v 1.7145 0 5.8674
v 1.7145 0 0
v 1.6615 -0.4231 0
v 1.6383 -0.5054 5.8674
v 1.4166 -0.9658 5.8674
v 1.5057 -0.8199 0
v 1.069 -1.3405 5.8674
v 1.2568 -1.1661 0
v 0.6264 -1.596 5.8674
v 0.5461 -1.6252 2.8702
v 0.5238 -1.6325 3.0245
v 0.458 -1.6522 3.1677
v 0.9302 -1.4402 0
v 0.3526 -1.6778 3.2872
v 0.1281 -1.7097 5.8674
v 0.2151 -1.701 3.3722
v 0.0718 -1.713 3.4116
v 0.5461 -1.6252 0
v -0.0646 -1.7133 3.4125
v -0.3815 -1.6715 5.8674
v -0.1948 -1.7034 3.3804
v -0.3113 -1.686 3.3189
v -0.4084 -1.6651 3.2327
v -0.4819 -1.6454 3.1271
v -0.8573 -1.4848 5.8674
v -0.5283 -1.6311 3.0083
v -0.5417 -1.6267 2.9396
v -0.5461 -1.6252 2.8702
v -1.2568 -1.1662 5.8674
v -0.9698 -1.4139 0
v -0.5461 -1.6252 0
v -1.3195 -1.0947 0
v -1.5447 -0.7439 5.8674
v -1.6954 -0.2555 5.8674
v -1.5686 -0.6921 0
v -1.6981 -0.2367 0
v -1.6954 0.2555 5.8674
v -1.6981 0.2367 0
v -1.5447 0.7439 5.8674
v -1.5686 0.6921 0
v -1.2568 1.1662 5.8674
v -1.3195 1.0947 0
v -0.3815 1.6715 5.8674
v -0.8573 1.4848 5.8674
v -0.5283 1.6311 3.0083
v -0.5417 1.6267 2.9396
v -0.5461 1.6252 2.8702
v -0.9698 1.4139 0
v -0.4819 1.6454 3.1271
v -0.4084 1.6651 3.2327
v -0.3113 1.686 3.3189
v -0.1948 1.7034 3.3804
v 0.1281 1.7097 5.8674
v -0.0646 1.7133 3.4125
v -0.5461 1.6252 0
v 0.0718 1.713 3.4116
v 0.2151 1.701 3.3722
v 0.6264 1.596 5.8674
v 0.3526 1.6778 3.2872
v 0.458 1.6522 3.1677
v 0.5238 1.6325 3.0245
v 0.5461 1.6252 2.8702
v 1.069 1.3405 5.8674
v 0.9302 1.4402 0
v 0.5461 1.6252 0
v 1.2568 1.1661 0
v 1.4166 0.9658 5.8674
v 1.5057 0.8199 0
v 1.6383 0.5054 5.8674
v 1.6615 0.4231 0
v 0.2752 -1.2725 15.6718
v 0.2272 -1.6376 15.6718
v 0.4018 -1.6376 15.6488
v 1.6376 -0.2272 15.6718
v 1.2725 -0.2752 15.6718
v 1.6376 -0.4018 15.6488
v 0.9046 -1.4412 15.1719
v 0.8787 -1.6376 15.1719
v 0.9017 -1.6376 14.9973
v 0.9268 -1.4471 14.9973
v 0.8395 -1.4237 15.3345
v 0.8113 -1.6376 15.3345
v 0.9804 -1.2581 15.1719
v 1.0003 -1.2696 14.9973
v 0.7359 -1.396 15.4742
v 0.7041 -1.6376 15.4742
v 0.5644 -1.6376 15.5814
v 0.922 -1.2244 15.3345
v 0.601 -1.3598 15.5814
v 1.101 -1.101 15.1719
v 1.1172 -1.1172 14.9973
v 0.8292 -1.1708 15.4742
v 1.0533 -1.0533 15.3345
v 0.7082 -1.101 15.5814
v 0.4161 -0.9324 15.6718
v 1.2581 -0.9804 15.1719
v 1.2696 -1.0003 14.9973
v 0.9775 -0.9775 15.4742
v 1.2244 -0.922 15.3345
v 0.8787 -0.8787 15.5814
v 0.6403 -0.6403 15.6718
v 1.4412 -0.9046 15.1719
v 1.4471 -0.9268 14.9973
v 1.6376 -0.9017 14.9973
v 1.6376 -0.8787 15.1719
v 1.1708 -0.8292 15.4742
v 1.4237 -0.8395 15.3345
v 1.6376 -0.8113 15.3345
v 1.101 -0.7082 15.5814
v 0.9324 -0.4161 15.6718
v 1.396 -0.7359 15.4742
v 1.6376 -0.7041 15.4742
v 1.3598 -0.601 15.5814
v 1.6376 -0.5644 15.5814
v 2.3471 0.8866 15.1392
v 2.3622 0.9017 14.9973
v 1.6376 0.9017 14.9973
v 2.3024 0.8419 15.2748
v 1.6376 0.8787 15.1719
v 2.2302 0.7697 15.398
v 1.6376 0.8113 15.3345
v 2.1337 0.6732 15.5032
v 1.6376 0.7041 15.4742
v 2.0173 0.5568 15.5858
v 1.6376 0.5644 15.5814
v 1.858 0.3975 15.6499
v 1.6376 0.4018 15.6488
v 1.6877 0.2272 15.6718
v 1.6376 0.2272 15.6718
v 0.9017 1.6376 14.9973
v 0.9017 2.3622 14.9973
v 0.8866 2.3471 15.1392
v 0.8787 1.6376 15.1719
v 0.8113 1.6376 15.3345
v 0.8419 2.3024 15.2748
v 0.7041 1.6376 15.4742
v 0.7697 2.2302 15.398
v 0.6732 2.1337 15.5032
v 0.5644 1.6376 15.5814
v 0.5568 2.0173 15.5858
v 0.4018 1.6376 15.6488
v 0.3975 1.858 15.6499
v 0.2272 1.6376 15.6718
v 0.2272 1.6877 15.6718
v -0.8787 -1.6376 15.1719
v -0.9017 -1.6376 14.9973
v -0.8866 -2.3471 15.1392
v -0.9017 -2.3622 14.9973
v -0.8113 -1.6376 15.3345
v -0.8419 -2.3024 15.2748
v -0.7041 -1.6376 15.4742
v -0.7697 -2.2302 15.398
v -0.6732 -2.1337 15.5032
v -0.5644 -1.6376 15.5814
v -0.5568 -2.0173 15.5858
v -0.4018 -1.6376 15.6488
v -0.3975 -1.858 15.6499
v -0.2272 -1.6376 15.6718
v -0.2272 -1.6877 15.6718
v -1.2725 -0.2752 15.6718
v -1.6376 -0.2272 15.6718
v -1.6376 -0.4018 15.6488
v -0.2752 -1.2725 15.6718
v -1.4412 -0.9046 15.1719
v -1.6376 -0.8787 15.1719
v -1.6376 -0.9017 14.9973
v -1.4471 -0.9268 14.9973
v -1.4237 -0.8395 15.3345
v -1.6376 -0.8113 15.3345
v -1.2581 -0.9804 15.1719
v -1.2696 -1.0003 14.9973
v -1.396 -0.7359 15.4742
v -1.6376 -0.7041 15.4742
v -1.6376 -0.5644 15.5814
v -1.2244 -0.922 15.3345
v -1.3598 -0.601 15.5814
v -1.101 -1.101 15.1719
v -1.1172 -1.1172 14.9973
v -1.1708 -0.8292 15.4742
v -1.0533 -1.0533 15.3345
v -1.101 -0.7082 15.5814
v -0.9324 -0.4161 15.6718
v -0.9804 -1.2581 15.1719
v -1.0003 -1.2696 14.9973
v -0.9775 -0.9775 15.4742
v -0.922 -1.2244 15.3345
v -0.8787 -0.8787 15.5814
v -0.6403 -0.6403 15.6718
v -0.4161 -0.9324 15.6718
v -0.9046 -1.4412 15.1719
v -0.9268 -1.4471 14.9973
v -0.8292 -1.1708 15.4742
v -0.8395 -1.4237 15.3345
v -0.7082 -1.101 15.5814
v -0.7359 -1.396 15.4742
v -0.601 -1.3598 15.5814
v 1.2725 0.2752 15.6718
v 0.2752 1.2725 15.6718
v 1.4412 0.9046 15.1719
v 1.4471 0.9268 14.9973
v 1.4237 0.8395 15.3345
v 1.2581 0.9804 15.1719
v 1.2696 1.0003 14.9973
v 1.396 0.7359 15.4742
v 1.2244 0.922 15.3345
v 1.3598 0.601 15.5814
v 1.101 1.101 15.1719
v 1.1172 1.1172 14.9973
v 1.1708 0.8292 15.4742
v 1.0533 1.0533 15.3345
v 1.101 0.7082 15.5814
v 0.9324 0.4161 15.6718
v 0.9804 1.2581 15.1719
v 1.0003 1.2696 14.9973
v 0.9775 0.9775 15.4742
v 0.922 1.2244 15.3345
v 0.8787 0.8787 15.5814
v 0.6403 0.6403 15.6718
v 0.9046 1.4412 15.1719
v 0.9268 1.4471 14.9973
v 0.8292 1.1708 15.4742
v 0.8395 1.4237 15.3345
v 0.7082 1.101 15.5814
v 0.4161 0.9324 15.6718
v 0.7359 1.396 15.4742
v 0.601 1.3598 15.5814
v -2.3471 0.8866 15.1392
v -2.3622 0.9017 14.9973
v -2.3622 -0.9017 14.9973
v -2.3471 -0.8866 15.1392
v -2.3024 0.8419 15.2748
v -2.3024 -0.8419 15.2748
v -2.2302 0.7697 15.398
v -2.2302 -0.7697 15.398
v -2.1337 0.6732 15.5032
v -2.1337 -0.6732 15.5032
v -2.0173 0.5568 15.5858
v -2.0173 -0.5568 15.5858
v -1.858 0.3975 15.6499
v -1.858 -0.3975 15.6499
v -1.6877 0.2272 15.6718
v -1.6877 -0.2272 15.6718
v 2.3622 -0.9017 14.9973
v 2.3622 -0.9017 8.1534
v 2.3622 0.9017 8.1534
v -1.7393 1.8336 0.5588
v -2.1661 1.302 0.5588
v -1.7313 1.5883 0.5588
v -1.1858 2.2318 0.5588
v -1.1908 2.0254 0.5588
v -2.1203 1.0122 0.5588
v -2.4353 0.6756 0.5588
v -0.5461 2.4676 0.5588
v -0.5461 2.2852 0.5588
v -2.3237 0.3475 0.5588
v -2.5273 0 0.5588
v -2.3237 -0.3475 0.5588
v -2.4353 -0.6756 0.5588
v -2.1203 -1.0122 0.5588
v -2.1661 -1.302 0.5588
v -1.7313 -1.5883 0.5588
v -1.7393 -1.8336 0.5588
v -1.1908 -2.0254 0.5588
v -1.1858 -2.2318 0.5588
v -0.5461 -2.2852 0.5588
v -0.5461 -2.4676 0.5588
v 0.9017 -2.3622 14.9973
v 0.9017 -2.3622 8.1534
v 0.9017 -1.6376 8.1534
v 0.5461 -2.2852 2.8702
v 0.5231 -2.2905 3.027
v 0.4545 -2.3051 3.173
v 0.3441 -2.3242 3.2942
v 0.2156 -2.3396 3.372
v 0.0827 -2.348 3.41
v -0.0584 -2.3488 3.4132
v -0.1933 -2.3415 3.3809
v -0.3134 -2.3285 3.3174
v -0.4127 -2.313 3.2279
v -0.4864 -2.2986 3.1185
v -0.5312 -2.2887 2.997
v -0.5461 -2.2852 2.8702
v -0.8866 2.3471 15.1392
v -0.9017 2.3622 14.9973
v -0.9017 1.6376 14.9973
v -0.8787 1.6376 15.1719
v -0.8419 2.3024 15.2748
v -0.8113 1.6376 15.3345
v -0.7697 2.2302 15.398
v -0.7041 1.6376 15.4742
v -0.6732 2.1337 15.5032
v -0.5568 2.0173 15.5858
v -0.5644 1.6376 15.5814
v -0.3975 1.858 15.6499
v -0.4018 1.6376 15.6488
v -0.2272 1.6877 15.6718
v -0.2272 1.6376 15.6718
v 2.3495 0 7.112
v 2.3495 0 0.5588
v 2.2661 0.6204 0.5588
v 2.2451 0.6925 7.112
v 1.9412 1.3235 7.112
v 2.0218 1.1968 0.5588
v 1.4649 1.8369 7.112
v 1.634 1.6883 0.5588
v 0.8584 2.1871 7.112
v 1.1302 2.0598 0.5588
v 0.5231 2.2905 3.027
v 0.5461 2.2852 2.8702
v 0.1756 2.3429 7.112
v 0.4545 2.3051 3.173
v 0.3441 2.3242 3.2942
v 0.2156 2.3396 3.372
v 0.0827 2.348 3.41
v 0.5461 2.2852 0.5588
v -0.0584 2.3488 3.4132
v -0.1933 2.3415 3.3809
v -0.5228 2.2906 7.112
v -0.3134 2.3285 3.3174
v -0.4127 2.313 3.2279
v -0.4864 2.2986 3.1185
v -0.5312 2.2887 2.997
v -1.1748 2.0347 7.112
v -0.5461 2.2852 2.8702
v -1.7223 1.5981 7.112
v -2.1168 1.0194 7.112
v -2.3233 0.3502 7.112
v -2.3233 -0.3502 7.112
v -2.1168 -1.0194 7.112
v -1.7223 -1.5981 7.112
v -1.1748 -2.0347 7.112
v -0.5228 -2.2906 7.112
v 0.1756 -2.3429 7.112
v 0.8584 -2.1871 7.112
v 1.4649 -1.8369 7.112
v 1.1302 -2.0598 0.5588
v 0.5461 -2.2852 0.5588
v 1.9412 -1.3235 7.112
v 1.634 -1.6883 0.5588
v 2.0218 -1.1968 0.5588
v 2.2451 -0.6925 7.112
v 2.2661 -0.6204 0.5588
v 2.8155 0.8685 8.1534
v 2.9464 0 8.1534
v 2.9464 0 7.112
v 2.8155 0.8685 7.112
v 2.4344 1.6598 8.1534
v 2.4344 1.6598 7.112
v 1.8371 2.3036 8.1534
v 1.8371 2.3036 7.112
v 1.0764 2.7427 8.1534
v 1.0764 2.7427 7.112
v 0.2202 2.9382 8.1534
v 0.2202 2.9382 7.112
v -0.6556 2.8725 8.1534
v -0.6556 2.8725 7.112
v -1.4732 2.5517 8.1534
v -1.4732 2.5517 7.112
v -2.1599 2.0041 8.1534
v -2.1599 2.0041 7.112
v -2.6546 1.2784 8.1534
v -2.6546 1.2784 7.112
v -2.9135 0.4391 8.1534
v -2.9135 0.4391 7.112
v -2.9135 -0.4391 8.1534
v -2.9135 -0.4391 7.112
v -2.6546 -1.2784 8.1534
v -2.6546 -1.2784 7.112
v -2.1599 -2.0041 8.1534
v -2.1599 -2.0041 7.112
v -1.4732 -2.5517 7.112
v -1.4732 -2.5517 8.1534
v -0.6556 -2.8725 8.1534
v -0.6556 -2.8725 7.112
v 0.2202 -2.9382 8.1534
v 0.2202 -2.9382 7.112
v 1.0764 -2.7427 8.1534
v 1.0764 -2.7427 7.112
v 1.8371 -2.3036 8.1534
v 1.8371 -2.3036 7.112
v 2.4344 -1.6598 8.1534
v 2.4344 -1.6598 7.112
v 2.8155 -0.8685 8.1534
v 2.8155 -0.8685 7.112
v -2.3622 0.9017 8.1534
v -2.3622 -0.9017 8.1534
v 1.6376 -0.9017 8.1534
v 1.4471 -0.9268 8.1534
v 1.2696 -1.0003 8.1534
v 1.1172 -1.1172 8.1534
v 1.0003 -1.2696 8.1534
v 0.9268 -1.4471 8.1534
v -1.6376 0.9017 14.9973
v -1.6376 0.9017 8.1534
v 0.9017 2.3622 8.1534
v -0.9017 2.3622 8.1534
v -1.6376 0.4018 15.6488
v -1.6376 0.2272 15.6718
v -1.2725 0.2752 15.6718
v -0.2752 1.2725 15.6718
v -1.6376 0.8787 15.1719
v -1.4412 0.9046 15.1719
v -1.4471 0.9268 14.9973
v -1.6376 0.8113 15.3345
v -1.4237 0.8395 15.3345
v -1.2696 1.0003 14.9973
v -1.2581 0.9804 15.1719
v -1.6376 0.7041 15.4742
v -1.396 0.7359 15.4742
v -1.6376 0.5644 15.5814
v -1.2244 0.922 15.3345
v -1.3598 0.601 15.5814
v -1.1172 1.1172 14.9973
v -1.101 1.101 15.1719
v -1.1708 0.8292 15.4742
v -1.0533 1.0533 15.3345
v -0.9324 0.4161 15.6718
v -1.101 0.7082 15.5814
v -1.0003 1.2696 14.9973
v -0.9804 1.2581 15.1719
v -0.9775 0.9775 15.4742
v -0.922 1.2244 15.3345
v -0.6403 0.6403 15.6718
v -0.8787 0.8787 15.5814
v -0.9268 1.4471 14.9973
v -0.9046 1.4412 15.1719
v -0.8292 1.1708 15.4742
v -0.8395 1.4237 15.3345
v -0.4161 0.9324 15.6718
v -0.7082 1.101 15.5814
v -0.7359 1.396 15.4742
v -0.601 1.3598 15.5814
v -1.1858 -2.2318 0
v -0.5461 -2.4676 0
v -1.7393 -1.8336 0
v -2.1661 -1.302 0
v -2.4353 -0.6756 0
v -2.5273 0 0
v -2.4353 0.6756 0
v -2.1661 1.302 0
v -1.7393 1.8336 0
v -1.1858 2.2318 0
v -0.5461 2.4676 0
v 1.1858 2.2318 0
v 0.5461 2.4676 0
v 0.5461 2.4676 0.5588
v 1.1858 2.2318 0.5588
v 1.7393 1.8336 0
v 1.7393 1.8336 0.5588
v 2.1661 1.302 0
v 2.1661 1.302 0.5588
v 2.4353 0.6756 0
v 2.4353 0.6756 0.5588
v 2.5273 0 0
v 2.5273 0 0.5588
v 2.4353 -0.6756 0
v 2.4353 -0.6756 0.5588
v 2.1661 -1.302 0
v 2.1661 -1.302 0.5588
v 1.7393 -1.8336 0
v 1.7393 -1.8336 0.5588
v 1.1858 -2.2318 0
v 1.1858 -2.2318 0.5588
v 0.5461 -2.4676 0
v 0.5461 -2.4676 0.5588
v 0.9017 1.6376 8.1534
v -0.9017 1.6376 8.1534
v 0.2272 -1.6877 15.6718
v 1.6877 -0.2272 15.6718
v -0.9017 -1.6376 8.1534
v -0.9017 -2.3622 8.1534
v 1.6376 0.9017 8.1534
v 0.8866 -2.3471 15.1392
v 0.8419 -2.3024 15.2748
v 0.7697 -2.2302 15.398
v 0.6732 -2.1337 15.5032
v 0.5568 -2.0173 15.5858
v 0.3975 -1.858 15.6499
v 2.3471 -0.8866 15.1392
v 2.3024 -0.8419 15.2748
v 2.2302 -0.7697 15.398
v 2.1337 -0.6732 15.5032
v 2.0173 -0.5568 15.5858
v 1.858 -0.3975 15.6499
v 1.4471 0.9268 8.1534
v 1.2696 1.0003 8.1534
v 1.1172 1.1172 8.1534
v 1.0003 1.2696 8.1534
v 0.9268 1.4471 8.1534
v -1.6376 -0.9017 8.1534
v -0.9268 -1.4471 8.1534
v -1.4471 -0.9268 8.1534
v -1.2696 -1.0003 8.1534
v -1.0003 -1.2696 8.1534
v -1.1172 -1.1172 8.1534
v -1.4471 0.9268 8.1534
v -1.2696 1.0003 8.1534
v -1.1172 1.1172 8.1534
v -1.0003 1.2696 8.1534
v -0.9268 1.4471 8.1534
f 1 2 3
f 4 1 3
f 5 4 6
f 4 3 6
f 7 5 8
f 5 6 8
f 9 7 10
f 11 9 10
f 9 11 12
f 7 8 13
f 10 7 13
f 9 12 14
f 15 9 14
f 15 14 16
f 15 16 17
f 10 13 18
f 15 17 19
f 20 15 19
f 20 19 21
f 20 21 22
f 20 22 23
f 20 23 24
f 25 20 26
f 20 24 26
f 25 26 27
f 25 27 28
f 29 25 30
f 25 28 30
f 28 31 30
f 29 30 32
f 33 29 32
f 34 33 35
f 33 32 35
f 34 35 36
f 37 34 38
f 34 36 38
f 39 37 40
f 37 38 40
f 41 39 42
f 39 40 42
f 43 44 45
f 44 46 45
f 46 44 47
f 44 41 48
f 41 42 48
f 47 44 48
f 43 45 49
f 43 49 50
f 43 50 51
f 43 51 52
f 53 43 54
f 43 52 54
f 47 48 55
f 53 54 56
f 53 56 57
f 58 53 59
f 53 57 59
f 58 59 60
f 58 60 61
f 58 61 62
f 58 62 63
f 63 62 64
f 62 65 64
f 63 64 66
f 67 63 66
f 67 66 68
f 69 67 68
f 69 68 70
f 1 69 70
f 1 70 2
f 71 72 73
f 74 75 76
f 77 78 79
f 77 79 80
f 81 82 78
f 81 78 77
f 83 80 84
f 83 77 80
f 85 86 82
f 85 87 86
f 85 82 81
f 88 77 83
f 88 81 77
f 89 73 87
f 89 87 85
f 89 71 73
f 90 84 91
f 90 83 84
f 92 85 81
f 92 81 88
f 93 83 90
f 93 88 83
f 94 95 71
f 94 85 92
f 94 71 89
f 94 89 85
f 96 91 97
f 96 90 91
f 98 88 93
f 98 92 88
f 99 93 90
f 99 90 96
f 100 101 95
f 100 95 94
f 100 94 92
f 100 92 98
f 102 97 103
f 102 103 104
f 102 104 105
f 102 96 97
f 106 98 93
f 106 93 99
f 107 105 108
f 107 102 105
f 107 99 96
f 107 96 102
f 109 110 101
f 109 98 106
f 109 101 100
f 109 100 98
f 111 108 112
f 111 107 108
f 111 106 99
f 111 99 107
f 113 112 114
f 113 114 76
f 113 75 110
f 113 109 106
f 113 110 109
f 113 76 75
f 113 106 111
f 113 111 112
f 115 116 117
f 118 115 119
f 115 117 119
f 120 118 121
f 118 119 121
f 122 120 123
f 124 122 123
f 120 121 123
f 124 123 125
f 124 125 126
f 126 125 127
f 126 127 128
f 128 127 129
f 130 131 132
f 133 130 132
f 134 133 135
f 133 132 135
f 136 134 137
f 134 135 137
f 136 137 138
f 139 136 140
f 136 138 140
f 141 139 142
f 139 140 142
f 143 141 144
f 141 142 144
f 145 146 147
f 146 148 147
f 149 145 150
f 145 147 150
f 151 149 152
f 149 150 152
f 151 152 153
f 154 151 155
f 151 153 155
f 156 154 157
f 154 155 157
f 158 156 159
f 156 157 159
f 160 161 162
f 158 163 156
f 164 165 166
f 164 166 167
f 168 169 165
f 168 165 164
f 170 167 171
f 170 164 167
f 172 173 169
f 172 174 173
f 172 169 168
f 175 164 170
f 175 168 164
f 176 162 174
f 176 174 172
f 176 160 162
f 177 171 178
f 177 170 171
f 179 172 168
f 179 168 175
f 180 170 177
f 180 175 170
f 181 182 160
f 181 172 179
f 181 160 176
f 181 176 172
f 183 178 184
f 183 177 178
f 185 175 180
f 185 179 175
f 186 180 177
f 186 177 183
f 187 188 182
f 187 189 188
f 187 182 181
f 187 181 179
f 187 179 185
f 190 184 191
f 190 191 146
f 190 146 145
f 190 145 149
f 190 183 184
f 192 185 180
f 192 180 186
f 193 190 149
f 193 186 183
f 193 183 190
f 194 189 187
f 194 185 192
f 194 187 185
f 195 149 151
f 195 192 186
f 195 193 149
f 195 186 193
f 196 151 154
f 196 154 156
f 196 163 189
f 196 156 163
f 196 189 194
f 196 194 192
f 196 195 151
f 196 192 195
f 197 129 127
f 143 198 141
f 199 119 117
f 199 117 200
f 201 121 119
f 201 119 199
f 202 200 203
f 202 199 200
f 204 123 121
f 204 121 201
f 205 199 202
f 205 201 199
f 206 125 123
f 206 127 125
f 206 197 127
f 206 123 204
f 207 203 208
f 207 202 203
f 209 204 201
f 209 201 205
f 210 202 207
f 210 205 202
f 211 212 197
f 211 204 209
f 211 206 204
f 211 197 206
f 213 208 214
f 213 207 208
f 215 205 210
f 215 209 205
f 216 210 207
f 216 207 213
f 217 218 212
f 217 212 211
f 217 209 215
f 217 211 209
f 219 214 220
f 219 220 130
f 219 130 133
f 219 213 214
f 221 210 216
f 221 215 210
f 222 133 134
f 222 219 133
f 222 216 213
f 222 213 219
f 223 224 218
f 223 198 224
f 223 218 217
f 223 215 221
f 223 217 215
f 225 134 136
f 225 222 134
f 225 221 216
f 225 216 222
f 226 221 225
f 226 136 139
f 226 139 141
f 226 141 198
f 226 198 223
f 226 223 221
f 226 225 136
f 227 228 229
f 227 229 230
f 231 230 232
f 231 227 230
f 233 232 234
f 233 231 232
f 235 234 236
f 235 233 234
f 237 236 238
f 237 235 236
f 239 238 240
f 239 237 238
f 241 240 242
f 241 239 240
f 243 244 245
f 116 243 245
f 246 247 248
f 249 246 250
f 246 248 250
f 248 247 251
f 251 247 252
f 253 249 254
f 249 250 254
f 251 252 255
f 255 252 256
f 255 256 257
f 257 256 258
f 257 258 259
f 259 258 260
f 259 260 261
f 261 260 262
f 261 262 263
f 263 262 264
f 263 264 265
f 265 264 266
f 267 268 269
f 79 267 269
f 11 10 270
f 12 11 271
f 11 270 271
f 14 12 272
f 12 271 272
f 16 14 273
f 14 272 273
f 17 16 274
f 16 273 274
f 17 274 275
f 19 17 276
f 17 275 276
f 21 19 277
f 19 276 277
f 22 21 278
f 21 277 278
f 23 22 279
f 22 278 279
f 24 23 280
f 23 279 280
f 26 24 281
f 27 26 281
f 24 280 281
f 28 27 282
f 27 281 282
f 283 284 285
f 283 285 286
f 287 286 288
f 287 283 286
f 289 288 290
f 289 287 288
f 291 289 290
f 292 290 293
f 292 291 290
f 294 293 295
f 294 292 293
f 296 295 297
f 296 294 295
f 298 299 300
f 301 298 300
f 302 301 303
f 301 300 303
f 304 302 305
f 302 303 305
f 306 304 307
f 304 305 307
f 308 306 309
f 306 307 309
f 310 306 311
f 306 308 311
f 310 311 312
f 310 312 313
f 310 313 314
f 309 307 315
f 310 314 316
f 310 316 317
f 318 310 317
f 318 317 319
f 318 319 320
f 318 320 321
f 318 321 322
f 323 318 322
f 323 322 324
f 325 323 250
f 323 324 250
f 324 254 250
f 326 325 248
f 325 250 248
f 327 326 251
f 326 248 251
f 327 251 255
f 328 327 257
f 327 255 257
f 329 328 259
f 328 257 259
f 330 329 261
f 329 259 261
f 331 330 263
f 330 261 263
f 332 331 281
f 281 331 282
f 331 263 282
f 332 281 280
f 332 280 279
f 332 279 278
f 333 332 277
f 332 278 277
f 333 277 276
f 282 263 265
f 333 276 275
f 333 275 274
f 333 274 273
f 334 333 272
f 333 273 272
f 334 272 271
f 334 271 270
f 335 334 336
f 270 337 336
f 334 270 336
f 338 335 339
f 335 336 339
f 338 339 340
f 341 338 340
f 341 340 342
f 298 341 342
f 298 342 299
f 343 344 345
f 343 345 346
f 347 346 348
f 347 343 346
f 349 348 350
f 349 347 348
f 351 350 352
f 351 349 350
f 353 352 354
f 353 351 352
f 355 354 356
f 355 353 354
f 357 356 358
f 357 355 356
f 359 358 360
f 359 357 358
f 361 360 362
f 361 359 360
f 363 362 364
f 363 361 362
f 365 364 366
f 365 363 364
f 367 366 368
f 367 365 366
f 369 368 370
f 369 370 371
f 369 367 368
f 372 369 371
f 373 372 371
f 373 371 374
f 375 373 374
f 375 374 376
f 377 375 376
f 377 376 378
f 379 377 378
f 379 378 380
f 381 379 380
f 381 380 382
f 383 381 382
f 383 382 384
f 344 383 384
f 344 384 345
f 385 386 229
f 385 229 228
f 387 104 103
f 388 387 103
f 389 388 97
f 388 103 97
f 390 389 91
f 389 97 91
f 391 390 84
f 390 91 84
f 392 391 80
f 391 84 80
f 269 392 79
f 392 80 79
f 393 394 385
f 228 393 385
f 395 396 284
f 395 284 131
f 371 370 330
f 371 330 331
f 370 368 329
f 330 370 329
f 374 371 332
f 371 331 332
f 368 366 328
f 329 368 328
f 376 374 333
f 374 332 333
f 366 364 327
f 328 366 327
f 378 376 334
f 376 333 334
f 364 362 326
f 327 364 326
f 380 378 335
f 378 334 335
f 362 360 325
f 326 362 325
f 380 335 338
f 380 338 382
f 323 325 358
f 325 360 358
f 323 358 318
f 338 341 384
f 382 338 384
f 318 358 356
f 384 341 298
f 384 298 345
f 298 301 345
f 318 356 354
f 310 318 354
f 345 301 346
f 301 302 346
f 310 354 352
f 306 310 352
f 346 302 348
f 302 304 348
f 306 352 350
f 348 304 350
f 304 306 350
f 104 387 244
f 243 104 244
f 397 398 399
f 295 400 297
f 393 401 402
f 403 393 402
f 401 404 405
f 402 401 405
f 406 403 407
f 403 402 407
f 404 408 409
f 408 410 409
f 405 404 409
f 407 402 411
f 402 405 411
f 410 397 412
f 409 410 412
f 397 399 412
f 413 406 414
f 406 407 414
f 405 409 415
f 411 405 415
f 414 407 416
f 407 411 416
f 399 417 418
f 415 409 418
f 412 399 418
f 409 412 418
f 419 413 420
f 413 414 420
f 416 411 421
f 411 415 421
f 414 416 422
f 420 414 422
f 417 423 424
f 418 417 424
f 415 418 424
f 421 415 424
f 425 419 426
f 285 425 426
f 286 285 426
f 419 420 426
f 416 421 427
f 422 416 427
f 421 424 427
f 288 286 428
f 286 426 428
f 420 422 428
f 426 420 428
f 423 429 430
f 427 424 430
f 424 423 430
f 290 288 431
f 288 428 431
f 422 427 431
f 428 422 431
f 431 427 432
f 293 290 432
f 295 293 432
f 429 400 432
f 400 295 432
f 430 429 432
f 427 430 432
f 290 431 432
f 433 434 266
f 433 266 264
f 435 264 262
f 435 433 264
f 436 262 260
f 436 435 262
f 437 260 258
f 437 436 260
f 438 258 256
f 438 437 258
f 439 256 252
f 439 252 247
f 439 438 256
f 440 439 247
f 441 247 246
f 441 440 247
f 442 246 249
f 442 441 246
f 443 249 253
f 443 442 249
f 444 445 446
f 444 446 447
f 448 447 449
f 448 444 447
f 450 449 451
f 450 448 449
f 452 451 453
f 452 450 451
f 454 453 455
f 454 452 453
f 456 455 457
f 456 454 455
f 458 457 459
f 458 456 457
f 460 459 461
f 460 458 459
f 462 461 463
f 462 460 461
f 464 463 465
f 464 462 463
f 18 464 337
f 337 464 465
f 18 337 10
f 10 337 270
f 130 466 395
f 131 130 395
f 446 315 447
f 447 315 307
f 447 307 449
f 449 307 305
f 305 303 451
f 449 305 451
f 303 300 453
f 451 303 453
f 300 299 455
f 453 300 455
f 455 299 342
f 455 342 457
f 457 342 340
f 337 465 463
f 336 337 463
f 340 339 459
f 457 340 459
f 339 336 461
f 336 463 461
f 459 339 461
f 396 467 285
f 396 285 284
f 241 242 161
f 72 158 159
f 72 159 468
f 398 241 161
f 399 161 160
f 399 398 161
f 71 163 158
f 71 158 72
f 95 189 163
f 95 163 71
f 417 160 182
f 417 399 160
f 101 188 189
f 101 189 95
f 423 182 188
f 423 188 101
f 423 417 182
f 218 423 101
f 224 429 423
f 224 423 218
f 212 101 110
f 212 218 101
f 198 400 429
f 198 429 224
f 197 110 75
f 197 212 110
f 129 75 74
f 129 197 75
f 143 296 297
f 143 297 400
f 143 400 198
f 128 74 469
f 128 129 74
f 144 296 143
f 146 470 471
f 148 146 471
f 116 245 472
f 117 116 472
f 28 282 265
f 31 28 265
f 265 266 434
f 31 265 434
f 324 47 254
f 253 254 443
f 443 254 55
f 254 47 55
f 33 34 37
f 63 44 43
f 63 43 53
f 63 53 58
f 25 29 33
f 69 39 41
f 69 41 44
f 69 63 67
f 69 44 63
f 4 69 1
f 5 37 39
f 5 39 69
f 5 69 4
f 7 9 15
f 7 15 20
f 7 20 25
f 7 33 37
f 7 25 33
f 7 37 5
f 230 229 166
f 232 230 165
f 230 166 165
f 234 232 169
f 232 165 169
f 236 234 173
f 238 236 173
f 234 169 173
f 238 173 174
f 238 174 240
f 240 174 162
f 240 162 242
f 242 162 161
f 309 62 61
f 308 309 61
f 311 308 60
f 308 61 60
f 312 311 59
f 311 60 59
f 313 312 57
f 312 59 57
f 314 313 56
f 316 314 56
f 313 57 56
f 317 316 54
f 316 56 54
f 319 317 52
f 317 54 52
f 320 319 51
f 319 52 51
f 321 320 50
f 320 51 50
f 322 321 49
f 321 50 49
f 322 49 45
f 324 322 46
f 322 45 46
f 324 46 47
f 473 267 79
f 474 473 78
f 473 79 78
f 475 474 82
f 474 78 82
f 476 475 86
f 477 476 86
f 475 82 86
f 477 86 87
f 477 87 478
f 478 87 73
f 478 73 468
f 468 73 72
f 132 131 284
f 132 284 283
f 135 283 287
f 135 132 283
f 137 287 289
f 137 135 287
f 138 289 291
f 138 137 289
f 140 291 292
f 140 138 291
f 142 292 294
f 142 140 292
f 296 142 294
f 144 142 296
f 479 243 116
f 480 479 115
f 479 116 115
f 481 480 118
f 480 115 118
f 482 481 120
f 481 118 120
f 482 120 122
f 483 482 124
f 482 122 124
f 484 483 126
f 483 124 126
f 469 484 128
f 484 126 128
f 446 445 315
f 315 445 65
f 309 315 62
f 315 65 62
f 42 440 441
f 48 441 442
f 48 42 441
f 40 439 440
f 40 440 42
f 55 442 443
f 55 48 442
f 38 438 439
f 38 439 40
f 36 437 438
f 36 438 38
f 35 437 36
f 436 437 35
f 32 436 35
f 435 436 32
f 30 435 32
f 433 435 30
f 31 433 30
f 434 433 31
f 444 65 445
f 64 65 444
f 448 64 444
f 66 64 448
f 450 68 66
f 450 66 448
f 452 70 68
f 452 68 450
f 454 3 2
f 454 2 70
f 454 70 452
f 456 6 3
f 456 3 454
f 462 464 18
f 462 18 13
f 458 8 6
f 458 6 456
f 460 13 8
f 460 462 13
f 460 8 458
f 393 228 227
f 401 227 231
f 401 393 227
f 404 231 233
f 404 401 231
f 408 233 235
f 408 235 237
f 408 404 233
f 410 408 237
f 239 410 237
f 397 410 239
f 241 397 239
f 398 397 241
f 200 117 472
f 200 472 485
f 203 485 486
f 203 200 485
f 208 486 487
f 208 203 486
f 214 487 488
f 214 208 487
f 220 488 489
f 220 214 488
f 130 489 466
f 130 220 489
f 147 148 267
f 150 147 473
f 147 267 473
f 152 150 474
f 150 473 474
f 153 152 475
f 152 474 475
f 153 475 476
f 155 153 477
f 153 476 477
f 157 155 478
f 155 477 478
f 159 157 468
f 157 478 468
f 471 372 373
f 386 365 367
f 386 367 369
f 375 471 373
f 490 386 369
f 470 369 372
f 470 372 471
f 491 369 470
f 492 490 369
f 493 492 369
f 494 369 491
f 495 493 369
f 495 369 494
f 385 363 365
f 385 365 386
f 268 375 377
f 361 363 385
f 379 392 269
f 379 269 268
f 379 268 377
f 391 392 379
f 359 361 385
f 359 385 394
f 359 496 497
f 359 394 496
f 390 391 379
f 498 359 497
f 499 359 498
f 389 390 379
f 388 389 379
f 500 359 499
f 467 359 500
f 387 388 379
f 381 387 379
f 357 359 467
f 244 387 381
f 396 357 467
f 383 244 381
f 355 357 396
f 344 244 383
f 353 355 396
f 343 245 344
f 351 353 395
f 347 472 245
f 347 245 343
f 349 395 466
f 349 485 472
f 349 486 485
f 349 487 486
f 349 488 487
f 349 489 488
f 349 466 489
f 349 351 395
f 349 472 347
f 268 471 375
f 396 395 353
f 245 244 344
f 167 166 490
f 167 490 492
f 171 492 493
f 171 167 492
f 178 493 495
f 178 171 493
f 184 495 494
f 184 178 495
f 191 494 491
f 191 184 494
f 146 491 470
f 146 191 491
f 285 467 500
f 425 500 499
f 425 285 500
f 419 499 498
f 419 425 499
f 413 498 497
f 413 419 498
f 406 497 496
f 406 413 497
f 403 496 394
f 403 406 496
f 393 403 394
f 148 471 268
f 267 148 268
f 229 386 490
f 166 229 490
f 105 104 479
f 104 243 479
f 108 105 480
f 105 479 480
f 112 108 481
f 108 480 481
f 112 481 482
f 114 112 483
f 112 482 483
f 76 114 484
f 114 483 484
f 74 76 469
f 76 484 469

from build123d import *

# Parameters (mm, degrees)
F0_R      = 2.3495
F1_DEPTH  = 15.6718
F3_R      = 2.5273
F4_DEPTH  = 0.5588
F5_DEPTH  = 12.7
F6_R      = 2.9464
F7_DEPTH  = 8.5598
F8_R      = 12.7
F9_DEPTH  = 7.5184
F10_W     = 1.4605
F10_H     = 1.8034
F10_W_2   = 1.8034
F10_H_2   = 1.4605
F11_DEPTH = 7.5184
F12_R     = 0.7358522938
F13_R     = 0.6745312693
F14_R     = 1.7145
F15_DEPTH = 5.8674


with BuildPart() as f1:
    # F0 (on Top) → F1 (new body)
    with BuildSketch(Plane.XY):
        Circle(F0_R)
    extrude(amount=F1_DEPTH)

    # F3 (on face) → F4 (join)
    with BuildSketch(Plane(origin=(0, 0, 0), x_dir=(1, 0, 0), z_dir=(0, 0, -1))):
        Circle(F3_R)
    extrude(amount=-F4_DEPTH)

    # F2 (on Front) → F5 (cut, symmetric)
    with BuildSketch(Plane.XZ):
        with BuildLine():
            Line((-0.5461, -2.8702), (0.5461, -2.8702))
            Line((0.5461, -2.8702), (0.5461, 2.8702))
            ThreePointArc((0.5461, 2.8702), (0, 2.3241), (-0.5461, 2.8702))
            Line((-0.5461, 2.8702), (-0.5461, -2.8702))
        make_face()
        with BuildLine():
            ThreePointArc((-0.5461, 2.8702), (0, 2.3241), (0.5461, 2.8702))
            Line((0.5461, 2.8702), (-0.5461, 2.8702))
        make_face()
        with BuildLine():
            Line((-0.5461, 2.8702), (0.5461, 2.8702))
            ThreePointArc((0.5461, 2.8702), (0, 3.4163), (-0.5461, 2.8702))
        make_face()
    extrude(amount=F5_DEPTH, both=True, mode=Mode.SUBTRACT)

    # F6 (on face) → F7 (join)
    with BuildSketch(Plane.XY.offset(15.6718)):
        Circle(F6_R)
    extrude(amount=-F7_DEPTH)

    # F8 (on face) → F9 (cut)
    with BuildSketch(Plane.XY.offset(15.6718)):
        Circle(F8_R)
    extrude(amount=-F9_DEPTH, mode=Mode.SUBTRACT)

    # F10 (on face) → F11 (join)
    with BuildSketch(Plane.XY.offset(8.1534)):
        with Locations((1.63195, 0)):
            Rectangle(F10_W, F10_H)
        with Locations((0, -1.63195)):
            Rectangle(F10_W_2, F10_H_2)
        Rectangle(F10_W_2, F10_H)
        with Locations((-1.63195, 0)):
            Rectangle(F10_W, F10_H)
        with Locations((0, 1.63195)):
            Rectangle(F10_W_2, F10_H_2)
    extrude(amount=F11_DEPTH)

    # F12
    f12_edges = [f1.edges().sort_by_distance(p)[0] for p in [
        (-0.9017, -0.9017, 11.9126),
        (0.9017, 0.9017, 11.9126),
        (0.9017, -0.9017, 11.9126),
        (-0.9017, 0.9017, 11.9126),
    ]]
    fillet(f12_edges, radius=F12_R)

    # F13
    f13_edges = [f1.edges().sort_by_distance(p)[0] for p in [
        (1.999876, -0.9017, 15.6718),
        (1.117226, -1.117226, 15.6718),
        (2.3622, 0, 15.6718),
        (0.9017, -1.999876, 15.6718),
        (1.999876, 0.9017, 15.6718),
        (0, -2.3622, 15.6718),
        (1.117226, 1.117226, 15.6718),
        (-0.9017, -1.999876, 15.6718),
        (0.9017, 1.999876, 15.6718),
        (-1.117226, -1.117226, 15.6718),
        (0, 2.3622, 15.6718),
        (-1.999876, -0.9017, 15.6718),
        (-0.9017, 1.999876, 15.6718),
        (-2.3622, 0, 15.6718),
        (-1.117226, 1.117226, 15.6718),
        (-1.999876, 0.9017, 15.6718),
    ]]
    fillet(f13_edges, radius=F13_R)

    # F14 (on face) → F15 (cut)
    with BuildSketch(Plane(origin=(0, 0, 0), x_dir=(1, 0, 0), z_dir=(0, 0, -1))):
        Circle(F14_R)
    extrude(amount=-F15_DEPTH, mode=Mode.SUBTRACT)


solid = f1.part
